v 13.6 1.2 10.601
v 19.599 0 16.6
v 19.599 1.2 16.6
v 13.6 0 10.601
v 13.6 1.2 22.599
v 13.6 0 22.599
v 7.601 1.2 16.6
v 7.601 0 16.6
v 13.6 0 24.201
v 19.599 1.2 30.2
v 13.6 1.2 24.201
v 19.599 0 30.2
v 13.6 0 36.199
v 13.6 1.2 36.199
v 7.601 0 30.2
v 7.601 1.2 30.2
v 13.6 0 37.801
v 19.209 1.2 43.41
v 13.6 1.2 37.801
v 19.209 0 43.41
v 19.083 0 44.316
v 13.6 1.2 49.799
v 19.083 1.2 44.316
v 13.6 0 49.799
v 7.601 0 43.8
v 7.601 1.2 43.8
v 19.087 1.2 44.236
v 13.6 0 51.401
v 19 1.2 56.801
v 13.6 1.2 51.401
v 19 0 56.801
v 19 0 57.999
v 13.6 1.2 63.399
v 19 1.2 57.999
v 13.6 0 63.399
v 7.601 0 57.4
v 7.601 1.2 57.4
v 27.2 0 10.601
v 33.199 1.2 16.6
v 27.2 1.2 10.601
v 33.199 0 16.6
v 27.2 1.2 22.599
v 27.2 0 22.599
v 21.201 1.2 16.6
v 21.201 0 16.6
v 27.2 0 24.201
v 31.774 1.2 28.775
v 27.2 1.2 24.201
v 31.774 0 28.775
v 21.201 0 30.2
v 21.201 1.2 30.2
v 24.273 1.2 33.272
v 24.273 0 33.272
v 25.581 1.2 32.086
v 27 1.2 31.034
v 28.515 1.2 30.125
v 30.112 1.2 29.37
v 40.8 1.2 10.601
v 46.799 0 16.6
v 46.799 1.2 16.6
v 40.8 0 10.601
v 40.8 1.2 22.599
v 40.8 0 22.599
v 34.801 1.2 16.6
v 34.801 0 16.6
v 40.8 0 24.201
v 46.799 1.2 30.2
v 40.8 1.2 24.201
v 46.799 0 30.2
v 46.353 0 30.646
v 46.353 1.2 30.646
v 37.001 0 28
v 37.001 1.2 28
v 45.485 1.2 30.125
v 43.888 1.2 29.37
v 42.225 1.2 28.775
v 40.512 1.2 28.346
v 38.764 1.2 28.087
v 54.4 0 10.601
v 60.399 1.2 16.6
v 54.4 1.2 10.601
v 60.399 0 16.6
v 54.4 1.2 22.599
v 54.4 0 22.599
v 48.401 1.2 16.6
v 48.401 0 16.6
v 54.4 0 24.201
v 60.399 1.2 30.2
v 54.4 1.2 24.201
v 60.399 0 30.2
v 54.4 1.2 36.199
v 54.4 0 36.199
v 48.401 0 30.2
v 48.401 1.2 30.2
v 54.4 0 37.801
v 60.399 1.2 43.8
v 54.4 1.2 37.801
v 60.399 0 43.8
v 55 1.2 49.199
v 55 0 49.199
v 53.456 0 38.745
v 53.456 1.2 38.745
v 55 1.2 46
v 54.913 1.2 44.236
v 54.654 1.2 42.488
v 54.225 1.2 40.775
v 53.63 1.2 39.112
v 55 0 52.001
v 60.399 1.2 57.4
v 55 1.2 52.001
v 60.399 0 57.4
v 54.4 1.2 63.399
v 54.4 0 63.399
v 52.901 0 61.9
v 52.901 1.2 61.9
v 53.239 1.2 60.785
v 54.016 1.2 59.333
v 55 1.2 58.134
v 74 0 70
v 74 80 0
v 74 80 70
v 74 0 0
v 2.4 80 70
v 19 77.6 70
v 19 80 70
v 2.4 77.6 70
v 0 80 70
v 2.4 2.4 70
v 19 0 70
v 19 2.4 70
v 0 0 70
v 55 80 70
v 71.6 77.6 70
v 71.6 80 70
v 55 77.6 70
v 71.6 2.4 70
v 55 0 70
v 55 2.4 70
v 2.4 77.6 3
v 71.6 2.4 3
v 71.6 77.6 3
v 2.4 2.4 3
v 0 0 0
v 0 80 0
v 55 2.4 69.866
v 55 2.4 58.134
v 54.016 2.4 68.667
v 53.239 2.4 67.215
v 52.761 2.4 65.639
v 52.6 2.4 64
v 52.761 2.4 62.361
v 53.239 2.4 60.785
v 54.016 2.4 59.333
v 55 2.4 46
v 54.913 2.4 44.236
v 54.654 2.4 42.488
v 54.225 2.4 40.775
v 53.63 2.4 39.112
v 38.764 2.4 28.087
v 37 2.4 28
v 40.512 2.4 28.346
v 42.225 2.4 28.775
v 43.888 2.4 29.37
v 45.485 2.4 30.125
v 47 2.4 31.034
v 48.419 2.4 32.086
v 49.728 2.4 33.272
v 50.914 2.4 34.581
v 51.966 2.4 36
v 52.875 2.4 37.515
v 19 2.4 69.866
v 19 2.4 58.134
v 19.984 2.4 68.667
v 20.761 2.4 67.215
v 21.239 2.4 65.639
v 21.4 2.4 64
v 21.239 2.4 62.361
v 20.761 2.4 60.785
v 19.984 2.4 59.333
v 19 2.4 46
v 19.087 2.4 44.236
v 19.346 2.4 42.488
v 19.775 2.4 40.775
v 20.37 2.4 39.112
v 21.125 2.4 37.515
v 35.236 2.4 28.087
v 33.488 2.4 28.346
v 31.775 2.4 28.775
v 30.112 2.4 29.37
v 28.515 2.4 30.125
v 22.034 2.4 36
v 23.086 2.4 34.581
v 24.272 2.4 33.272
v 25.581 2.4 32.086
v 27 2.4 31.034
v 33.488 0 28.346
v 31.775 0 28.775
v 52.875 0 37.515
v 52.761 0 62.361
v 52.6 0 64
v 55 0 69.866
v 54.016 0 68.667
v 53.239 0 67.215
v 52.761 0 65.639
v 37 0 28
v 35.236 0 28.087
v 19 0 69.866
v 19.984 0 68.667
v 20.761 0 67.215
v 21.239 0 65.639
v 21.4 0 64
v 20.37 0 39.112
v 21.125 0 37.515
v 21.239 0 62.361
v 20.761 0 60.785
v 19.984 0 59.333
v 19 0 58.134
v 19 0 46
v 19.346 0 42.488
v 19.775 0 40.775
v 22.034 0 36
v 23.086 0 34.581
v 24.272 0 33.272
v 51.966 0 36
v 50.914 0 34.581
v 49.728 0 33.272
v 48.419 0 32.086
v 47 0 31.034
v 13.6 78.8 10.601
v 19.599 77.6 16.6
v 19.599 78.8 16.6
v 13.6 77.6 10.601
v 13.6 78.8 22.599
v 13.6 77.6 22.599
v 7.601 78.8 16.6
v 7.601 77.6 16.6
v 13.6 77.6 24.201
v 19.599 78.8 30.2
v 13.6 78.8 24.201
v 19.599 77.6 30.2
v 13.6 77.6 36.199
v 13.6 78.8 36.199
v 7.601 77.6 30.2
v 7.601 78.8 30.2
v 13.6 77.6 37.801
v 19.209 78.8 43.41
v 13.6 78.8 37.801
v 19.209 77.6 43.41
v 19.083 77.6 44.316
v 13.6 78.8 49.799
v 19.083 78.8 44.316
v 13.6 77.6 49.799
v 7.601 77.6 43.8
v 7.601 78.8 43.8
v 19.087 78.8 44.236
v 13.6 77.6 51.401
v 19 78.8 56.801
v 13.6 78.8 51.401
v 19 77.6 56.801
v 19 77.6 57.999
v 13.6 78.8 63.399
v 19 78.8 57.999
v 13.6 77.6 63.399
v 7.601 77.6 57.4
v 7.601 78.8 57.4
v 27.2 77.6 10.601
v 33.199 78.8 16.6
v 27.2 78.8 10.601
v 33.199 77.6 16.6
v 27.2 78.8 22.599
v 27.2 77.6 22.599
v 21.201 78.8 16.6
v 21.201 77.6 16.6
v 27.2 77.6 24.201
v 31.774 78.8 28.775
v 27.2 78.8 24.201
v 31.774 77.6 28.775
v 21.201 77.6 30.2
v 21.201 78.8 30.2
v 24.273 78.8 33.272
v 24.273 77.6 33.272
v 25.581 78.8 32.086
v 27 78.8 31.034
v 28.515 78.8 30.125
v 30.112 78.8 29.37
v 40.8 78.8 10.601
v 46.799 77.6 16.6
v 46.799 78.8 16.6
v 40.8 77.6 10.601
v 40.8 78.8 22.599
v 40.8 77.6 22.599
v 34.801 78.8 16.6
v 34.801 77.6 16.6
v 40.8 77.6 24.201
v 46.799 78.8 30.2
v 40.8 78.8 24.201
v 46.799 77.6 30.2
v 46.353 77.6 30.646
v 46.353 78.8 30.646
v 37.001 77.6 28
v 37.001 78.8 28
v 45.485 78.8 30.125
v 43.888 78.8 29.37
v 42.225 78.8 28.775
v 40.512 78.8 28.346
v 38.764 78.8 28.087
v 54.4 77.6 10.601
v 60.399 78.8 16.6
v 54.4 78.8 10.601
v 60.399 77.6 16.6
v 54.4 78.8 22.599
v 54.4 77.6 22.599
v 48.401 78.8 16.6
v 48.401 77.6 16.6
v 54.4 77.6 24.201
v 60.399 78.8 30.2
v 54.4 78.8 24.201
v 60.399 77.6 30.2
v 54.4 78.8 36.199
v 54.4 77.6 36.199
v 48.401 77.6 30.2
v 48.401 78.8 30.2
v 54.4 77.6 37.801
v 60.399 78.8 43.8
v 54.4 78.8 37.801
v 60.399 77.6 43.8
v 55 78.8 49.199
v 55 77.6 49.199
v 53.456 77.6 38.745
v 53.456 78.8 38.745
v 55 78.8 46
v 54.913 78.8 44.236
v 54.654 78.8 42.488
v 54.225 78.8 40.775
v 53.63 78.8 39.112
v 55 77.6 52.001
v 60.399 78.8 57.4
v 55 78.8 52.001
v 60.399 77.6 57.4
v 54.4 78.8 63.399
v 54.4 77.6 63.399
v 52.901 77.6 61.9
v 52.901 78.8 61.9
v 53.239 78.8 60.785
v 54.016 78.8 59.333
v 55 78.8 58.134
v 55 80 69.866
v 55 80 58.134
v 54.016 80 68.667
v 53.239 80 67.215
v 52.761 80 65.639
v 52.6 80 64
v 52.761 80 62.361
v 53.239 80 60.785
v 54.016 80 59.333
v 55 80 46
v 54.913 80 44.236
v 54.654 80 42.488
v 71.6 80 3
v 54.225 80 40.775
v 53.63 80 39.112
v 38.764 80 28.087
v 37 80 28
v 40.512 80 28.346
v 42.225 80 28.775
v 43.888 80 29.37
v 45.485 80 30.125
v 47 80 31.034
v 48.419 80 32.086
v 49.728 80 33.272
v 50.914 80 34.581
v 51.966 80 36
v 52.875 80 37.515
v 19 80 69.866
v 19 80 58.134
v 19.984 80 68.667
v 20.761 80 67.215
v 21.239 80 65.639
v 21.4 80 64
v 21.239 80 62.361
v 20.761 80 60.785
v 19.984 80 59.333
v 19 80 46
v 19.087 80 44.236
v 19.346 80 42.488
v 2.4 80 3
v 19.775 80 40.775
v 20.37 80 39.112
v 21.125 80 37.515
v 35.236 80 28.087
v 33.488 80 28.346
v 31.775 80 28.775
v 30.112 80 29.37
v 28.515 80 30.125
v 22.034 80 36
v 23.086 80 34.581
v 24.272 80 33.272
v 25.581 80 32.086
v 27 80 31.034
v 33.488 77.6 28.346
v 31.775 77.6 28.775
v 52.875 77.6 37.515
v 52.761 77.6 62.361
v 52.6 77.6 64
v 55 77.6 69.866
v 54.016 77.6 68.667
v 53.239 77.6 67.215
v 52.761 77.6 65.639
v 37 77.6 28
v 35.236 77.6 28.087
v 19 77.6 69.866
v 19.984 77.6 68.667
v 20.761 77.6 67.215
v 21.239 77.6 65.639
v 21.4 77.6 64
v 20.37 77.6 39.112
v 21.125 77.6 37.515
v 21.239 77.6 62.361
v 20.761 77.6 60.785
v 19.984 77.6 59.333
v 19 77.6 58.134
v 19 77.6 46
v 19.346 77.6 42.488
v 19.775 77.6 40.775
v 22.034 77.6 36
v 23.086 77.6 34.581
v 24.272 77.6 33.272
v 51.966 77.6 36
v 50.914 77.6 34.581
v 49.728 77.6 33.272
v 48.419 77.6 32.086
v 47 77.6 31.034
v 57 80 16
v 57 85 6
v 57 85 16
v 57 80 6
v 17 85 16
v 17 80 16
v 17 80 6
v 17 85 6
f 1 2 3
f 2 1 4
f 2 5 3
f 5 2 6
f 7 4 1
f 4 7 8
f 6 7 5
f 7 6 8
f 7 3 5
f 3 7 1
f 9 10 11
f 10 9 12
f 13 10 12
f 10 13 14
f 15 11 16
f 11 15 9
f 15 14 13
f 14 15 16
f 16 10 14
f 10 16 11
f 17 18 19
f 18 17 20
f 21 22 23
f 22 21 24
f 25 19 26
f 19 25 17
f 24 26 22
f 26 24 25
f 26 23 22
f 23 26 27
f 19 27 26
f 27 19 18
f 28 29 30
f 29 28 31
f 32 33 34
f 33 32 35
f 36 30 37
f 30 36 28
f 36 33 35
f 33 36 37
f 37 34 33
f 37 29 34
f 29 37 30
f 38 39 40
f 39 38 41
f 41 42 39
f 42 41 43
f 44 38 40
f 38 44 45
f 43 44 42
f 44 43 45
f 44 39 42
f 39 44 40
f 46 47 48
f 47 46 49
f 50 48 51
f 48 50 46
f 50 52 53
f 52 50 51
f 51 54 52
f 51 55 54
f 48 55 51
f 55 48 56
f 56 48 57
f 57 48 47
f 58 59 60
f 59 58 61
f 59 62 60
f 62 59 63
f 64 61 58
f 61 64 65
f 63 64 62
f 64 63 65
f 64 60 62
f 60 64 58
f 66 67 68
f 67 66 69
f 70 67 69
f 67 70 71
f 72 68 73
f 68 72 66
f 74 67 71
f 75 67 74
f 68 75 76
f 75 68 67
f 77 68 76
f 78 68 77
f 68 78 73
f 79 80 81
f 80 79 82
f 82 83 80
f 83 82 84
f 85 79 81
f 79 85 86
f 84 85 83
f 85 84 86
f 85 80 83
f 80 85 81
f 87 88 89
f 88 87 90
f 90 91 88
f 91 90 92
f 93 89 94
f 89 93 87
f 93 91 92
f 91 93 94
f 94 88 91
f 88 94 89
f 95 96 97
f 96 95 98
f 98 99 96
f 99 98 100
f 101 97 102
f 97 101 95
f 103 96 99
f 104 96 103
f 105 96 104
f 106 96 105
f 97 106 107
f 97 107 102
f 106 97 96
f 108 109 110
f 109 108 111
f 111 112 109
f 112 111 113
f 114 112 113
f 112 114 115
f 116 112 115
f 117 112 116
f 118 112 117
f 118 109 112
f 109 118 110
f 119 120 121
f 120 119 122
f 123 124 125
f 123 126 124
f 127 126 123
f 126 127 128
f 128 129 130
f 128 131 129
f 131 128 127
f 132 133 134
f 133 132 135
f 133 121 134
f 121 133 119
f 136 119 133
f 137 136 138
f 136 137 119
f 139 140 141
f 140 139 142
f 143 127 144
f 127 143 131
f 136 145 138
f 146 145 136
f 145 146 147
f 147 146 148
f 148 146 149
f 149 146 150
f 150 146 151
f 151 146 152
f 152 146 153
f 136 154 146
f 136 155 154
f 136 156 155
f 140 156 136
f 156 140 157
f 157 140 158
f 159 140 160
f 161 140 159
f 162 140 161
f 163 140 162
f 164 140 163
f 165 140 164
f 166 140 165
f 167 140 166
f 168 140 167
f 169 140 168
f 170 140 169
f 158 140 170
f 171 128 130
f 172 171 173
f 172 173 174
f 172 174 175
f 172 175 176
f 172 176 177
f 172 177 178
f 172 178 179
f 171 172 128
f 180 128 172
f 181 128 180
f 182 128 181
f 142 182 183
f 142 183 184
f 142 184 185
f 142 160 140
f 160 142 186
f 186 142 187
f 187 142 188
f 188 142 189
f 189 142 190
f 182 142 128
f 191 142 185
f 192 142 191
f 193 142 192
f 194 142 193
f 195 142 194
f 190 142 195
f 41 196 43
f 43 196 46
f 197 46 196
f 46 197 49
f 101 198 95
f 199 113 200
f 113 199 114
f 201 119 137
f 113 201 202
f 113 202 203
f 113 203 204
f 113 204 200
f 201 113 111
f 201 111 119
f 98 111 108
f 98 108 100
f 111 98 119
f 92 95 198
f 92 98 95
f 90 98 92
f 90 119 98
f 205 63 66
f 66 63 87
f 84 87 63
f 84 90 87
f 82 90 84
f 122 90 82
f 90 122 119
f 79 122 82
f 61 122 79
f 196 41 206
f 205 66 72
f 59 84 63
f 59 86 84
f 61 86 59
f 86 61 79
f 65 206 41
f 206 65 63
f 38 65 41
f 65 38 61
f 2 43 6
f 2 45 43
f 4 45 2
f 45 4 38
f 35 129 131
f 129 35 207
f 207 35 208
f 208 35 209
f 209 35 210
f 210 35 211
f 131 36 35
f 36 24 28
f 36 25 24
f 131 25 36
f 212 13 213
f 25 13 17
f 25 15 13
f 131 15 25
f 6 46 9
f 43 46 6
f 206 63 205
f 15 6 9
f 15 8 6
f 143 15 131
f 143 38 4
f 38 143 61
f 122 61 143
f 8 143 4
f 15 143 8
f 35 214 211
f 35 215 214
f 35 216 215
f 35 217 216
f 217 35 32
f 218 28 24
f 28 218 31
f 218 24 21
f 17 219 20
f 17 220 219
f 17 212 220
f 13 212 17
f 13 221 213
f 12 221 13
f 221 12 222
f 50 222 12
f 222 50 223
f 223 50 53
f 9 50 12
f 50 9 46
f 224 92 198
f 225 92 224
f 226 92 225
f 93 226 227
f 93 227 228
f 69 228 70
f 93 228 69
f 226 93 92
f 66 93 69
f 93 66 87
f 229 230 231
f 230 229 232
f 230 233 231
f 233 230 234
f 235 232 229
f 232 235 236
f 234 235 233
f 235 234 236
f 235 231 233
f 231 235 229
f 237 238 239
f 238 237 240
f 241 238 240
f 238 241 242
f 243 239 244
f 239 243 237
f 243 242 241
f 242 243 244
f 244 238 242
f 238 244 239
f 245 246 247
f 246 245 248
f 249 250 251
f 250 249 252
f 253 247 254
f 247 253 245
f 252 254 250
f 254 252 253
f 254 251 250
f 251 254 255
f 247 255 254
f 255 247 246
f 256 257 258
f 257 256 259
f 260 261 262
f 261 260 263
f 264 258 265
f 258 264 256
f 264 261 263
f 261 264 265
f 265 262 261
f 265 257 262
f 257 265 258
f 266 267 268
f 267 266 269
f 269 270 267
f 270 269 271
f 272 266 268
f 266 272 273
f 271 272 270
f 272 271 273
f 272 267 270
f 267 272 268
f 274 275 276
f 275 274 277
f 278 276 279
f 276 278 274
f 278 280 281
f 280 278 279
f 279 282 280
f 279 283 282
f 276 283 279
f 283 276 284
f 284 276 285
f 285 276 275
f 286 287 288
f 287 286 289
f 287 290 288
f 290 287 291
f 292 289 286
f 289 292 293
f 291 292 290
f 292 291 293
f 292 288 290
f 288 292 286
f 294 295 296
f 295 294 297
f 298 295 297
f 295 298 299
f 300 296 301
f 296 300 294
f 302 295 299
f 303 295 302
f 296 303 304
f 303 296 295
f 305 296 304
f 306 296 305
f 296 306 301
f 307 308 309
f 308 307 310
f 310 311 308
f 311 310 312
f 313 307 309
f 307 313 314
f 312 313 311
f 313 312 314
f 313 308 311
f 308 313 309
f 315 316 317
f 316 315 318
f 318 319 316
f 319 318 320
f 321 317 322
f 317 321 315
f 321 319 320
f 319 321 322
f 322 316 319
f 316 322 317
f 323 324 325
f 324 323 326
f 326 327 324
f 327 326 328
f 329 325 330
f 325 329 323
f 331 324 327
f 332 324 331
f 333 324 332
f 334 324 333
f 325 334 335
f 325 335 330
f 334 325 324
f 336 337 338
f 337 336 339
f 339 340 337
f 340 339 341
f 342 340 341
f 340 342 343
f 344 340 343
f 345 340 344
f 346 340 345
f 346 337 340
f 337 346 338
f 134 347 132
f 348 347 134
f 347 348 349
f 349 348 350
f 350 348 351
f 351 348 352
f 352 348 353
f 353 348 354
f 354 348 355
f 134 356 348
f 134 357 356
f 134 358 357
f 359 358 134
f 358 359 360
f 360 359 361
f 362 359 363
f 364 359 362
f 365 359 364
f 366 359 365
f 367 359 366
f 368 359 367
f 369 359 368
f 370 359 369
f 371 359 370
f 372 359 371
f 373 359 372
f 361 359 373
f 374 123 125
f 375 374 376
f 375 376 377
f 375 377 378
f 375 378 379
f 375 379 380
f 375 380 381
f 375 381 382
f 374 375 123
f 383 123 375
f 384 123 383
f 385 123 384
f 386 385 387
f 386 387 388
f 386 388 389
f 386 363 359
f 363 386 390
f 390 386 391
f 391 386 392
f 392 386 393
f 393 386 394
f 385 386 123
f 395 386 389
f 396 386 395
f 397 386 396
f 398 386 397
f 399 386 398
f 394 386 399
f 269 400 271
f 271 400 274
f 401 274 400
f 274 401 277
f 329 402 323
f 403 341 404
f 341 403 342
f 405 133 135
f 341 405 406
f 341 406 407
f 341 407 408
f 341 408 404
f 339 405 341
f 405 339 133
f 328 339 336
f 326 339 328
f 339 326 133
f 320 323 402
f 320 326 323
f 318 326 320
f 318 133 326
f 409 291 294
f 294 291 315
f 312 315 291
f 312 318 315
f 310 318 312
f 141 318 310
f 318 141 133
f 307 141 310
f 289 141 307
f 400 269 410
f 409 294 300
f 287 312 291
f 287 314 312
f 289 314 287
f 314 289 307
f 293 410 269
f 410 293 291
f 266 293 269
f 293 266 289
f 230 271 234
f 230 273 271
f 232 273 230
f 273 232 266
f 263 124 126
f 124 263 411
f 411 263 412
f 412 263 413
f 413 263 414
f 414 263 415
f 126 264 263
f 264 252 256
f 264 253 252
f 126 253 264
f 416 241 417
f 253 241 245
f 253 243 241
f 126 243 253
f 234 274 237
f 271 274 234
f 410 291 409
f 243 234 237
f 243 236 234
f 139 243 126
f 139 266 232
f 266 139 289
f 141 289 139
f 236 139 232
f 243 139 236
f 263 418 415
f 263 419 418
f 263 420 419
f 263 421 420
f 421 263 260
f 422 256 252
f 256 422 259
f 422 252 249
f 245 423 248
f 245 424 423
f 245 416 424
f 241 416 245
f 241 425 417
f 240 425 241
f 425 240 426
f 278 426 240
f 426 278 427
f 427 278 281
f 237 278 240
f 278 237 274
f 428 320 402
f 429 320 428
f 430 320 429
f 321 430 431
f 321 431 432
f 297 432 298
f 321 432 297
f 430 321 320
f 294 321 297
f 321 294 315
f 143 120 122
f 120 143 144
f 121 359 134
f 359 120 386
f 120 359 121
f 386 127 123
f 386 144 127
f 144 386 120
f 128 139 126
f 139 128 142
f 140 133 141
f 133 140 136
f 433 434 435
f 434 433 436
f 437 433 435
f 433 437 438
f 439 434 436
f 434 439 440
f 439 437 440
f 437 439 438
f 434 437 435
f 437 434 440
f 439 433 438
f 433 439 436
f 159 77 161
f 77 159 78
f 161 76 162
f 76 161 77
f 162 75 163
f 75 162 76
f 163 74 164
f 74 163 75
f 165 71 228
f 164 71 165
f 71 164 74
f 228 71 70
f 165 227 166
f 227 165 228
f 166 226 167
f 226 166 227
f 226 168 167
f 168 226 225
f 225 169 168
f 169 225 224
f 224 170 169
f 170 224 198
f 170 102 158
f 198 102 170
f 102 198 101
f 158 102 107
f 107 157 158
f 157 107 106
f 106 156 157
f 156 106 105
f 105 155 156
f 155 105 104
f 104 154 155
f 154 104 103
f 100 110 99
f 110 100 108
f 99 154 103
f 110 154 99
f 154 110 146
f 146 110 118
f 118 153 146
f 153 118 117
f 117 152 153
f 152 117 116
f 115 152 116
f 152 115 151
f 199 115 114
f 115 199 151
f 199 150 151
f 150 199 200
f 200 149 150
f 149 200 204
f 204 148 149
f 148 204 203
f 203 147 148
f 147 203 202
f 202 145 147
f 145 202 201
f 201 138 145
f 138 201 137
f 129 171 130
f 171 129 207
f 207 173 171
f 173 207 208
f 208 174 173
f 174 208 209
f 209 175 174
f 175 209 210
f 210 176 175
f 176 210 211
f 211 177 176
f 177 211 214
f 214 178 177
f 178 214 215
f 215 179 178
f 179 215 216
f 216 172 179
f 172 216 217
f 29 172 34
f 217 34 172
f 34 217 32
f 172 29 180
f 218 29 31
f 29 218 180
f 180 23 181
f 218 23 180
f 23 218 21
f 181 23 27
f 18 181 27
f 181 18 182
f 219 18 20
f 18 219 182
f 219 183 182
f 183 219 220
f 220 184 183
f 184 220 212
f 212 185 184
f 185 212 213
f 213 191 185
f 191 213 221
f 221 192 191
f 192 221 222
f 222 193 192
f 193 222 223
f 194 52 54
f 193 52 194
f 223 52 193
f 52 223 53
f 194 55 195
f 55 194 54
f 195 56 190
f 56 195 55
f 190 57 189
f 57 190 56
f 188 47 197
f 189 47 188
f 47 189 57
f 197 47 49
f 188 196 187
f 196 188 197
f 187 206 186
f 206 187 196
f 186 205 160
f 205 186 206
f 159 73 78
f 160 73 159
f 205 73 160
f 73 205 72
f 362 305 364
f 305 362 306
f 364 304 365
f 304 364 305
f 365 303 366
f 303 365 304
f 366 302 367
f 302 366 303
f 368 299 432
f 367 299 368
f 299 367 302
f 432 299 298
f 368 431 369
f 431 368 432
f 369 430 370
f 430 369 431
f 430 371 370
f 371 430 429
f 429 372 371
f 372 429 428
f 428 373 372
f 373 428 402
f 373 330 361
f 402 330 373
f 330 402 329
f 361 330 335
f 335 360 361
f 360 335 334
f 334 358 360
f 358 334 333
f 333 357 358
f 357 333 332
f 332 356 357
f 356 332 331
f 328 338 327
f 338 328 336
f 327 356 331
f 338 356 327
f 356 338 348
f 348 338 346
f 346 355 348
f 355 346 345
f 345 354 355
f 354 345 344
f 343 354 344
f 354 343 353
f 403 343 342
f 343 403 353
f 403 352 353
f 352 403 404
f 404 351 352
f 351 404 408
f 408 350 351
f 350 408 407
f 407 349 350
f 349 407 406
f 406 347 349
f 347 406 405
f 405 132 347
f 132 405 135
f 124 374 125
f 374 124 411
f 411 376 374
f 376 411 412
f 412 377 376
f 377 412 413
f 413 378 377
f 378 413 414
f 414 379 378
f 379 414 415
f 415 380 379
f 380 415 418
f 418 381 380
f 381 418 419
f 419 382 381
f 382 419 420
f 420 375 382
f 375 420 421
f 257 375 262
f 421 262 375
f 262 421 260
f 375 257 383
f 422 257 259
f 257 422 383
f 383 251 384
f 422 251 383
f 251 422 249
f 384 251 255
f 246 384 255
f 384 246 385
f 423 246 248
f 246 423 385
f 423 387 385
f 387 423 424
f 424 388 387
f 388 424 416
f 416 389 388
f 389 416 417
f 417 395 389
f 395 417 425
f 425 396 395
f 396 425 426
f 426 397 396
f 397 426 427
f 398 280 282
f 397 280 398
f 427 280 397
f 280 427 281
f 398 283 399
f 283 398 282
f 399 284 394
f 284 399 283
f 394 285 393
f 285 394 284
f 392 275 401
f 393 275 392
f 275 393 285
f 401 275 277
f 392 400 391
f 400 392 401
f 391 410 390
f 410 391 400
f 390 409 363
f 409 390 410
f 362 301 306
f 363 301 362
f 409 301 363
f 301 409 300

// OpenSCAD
// ============================================================
//  joint_test.scad — 1-cell prototype, lattice front/back
//  Print TWO: joint_test.scad (front) + joint_back.scad (back)
//  Each ~45 min, print together on same bed
// ============================================================

cw   = 74;
cd   = 80;
wh   = 70;
ow   = 2.4;
bt   = 3.0;
tt   = 5;
tl   = 40;
th   = 10;
tol  = 0.3;
lat_gap    = 12;
lat_strand = 1.6;
uc_w = 36;
uc_r = 18;
uc_dep = 42;
tc_r = 6;
tx = cw / 2;

// Lattice wall running along X
module lat_wall_x(len, ht, thick, gap, strand) {
    pitch = gap + strand;
    difference() {
        cube([len, thick, ht]);
        for (xi=[pitch:pitch:len-pitch/2], zi=[pitch:pitch:ht-pitch/2])
            translate([xi,-0.1,zi]) rotate([0,45,0])
                cube([gap*0.707,thick+0.2,gap*0.707],center=true);
    }
}

module u_profile_2d() {
    half = uc_w/2;
    difference() {
        union() {
            translate([-half, uc_r]) square([uc_w, uc_dep-uc_r]);
            translate([0, uc_r]) circle(r=uc_r, $fn=64);
        }
        translate([-half-tc_r, uc_dep-tc_r]) circle(r=tc_r*1.4, $fn=32);
        translate([ half+tc_r, uc_dep-tc_r]) circle(r=tc_r*1.4, $fn=32);
    }
}

module u_cut(wt) {
    translate([0, wt, wh-uc_dep])
        rotate([90,0,0])
            linear_extrude(wt+0.2)
                u_profile_2d();
}

module test_piece(is_front=true) {
    difference() {
        union() {
            // Base
            cube([cw, cd, bt]);
            // Front wall — lattice
            translate([0, 0, bt])
                lat_wall_x(cw, wh-bt, ow, lat_gap, lat_strand);
            // Back wall — lattice
            translate([0, cd-ow, bt])
                lat_wall_x(cw, wh-bt, ow, lat_gap, lat_strand);
            // Left wall — solid
            translate([0, 0, bt]) cube([ow, cd, wh-bt]);
            // Right wall — solid
            translate([cw-ow, 0, bt]) cube([ow, cd, wh-bt]);

            // Tongue or receiver block
            if (is_front)
                translate([tx-tl/2, cd, bt+3]) cube([tl, tt, th]);
            else
                translate([tx-tl/2, 0, bt+3]) cube([tl, tt*2, th]);
        }

        // U cutouts
        translate([cw/2, 0, 0])    u_cut(ow);
        translate([cw/2, cd-ow, 0]) u_cut(ow);

        // Groove pocket on back piece
        if (!is_front)
            translate([tx-tl/2-tol, -0.1, bt+3-tol])
                cube([tl+tol*2, tt+tol, th+tol+0.1]);
    }
}

test_piece(is_front=true);
// For back piece: change to test_piece(is_front=false);
